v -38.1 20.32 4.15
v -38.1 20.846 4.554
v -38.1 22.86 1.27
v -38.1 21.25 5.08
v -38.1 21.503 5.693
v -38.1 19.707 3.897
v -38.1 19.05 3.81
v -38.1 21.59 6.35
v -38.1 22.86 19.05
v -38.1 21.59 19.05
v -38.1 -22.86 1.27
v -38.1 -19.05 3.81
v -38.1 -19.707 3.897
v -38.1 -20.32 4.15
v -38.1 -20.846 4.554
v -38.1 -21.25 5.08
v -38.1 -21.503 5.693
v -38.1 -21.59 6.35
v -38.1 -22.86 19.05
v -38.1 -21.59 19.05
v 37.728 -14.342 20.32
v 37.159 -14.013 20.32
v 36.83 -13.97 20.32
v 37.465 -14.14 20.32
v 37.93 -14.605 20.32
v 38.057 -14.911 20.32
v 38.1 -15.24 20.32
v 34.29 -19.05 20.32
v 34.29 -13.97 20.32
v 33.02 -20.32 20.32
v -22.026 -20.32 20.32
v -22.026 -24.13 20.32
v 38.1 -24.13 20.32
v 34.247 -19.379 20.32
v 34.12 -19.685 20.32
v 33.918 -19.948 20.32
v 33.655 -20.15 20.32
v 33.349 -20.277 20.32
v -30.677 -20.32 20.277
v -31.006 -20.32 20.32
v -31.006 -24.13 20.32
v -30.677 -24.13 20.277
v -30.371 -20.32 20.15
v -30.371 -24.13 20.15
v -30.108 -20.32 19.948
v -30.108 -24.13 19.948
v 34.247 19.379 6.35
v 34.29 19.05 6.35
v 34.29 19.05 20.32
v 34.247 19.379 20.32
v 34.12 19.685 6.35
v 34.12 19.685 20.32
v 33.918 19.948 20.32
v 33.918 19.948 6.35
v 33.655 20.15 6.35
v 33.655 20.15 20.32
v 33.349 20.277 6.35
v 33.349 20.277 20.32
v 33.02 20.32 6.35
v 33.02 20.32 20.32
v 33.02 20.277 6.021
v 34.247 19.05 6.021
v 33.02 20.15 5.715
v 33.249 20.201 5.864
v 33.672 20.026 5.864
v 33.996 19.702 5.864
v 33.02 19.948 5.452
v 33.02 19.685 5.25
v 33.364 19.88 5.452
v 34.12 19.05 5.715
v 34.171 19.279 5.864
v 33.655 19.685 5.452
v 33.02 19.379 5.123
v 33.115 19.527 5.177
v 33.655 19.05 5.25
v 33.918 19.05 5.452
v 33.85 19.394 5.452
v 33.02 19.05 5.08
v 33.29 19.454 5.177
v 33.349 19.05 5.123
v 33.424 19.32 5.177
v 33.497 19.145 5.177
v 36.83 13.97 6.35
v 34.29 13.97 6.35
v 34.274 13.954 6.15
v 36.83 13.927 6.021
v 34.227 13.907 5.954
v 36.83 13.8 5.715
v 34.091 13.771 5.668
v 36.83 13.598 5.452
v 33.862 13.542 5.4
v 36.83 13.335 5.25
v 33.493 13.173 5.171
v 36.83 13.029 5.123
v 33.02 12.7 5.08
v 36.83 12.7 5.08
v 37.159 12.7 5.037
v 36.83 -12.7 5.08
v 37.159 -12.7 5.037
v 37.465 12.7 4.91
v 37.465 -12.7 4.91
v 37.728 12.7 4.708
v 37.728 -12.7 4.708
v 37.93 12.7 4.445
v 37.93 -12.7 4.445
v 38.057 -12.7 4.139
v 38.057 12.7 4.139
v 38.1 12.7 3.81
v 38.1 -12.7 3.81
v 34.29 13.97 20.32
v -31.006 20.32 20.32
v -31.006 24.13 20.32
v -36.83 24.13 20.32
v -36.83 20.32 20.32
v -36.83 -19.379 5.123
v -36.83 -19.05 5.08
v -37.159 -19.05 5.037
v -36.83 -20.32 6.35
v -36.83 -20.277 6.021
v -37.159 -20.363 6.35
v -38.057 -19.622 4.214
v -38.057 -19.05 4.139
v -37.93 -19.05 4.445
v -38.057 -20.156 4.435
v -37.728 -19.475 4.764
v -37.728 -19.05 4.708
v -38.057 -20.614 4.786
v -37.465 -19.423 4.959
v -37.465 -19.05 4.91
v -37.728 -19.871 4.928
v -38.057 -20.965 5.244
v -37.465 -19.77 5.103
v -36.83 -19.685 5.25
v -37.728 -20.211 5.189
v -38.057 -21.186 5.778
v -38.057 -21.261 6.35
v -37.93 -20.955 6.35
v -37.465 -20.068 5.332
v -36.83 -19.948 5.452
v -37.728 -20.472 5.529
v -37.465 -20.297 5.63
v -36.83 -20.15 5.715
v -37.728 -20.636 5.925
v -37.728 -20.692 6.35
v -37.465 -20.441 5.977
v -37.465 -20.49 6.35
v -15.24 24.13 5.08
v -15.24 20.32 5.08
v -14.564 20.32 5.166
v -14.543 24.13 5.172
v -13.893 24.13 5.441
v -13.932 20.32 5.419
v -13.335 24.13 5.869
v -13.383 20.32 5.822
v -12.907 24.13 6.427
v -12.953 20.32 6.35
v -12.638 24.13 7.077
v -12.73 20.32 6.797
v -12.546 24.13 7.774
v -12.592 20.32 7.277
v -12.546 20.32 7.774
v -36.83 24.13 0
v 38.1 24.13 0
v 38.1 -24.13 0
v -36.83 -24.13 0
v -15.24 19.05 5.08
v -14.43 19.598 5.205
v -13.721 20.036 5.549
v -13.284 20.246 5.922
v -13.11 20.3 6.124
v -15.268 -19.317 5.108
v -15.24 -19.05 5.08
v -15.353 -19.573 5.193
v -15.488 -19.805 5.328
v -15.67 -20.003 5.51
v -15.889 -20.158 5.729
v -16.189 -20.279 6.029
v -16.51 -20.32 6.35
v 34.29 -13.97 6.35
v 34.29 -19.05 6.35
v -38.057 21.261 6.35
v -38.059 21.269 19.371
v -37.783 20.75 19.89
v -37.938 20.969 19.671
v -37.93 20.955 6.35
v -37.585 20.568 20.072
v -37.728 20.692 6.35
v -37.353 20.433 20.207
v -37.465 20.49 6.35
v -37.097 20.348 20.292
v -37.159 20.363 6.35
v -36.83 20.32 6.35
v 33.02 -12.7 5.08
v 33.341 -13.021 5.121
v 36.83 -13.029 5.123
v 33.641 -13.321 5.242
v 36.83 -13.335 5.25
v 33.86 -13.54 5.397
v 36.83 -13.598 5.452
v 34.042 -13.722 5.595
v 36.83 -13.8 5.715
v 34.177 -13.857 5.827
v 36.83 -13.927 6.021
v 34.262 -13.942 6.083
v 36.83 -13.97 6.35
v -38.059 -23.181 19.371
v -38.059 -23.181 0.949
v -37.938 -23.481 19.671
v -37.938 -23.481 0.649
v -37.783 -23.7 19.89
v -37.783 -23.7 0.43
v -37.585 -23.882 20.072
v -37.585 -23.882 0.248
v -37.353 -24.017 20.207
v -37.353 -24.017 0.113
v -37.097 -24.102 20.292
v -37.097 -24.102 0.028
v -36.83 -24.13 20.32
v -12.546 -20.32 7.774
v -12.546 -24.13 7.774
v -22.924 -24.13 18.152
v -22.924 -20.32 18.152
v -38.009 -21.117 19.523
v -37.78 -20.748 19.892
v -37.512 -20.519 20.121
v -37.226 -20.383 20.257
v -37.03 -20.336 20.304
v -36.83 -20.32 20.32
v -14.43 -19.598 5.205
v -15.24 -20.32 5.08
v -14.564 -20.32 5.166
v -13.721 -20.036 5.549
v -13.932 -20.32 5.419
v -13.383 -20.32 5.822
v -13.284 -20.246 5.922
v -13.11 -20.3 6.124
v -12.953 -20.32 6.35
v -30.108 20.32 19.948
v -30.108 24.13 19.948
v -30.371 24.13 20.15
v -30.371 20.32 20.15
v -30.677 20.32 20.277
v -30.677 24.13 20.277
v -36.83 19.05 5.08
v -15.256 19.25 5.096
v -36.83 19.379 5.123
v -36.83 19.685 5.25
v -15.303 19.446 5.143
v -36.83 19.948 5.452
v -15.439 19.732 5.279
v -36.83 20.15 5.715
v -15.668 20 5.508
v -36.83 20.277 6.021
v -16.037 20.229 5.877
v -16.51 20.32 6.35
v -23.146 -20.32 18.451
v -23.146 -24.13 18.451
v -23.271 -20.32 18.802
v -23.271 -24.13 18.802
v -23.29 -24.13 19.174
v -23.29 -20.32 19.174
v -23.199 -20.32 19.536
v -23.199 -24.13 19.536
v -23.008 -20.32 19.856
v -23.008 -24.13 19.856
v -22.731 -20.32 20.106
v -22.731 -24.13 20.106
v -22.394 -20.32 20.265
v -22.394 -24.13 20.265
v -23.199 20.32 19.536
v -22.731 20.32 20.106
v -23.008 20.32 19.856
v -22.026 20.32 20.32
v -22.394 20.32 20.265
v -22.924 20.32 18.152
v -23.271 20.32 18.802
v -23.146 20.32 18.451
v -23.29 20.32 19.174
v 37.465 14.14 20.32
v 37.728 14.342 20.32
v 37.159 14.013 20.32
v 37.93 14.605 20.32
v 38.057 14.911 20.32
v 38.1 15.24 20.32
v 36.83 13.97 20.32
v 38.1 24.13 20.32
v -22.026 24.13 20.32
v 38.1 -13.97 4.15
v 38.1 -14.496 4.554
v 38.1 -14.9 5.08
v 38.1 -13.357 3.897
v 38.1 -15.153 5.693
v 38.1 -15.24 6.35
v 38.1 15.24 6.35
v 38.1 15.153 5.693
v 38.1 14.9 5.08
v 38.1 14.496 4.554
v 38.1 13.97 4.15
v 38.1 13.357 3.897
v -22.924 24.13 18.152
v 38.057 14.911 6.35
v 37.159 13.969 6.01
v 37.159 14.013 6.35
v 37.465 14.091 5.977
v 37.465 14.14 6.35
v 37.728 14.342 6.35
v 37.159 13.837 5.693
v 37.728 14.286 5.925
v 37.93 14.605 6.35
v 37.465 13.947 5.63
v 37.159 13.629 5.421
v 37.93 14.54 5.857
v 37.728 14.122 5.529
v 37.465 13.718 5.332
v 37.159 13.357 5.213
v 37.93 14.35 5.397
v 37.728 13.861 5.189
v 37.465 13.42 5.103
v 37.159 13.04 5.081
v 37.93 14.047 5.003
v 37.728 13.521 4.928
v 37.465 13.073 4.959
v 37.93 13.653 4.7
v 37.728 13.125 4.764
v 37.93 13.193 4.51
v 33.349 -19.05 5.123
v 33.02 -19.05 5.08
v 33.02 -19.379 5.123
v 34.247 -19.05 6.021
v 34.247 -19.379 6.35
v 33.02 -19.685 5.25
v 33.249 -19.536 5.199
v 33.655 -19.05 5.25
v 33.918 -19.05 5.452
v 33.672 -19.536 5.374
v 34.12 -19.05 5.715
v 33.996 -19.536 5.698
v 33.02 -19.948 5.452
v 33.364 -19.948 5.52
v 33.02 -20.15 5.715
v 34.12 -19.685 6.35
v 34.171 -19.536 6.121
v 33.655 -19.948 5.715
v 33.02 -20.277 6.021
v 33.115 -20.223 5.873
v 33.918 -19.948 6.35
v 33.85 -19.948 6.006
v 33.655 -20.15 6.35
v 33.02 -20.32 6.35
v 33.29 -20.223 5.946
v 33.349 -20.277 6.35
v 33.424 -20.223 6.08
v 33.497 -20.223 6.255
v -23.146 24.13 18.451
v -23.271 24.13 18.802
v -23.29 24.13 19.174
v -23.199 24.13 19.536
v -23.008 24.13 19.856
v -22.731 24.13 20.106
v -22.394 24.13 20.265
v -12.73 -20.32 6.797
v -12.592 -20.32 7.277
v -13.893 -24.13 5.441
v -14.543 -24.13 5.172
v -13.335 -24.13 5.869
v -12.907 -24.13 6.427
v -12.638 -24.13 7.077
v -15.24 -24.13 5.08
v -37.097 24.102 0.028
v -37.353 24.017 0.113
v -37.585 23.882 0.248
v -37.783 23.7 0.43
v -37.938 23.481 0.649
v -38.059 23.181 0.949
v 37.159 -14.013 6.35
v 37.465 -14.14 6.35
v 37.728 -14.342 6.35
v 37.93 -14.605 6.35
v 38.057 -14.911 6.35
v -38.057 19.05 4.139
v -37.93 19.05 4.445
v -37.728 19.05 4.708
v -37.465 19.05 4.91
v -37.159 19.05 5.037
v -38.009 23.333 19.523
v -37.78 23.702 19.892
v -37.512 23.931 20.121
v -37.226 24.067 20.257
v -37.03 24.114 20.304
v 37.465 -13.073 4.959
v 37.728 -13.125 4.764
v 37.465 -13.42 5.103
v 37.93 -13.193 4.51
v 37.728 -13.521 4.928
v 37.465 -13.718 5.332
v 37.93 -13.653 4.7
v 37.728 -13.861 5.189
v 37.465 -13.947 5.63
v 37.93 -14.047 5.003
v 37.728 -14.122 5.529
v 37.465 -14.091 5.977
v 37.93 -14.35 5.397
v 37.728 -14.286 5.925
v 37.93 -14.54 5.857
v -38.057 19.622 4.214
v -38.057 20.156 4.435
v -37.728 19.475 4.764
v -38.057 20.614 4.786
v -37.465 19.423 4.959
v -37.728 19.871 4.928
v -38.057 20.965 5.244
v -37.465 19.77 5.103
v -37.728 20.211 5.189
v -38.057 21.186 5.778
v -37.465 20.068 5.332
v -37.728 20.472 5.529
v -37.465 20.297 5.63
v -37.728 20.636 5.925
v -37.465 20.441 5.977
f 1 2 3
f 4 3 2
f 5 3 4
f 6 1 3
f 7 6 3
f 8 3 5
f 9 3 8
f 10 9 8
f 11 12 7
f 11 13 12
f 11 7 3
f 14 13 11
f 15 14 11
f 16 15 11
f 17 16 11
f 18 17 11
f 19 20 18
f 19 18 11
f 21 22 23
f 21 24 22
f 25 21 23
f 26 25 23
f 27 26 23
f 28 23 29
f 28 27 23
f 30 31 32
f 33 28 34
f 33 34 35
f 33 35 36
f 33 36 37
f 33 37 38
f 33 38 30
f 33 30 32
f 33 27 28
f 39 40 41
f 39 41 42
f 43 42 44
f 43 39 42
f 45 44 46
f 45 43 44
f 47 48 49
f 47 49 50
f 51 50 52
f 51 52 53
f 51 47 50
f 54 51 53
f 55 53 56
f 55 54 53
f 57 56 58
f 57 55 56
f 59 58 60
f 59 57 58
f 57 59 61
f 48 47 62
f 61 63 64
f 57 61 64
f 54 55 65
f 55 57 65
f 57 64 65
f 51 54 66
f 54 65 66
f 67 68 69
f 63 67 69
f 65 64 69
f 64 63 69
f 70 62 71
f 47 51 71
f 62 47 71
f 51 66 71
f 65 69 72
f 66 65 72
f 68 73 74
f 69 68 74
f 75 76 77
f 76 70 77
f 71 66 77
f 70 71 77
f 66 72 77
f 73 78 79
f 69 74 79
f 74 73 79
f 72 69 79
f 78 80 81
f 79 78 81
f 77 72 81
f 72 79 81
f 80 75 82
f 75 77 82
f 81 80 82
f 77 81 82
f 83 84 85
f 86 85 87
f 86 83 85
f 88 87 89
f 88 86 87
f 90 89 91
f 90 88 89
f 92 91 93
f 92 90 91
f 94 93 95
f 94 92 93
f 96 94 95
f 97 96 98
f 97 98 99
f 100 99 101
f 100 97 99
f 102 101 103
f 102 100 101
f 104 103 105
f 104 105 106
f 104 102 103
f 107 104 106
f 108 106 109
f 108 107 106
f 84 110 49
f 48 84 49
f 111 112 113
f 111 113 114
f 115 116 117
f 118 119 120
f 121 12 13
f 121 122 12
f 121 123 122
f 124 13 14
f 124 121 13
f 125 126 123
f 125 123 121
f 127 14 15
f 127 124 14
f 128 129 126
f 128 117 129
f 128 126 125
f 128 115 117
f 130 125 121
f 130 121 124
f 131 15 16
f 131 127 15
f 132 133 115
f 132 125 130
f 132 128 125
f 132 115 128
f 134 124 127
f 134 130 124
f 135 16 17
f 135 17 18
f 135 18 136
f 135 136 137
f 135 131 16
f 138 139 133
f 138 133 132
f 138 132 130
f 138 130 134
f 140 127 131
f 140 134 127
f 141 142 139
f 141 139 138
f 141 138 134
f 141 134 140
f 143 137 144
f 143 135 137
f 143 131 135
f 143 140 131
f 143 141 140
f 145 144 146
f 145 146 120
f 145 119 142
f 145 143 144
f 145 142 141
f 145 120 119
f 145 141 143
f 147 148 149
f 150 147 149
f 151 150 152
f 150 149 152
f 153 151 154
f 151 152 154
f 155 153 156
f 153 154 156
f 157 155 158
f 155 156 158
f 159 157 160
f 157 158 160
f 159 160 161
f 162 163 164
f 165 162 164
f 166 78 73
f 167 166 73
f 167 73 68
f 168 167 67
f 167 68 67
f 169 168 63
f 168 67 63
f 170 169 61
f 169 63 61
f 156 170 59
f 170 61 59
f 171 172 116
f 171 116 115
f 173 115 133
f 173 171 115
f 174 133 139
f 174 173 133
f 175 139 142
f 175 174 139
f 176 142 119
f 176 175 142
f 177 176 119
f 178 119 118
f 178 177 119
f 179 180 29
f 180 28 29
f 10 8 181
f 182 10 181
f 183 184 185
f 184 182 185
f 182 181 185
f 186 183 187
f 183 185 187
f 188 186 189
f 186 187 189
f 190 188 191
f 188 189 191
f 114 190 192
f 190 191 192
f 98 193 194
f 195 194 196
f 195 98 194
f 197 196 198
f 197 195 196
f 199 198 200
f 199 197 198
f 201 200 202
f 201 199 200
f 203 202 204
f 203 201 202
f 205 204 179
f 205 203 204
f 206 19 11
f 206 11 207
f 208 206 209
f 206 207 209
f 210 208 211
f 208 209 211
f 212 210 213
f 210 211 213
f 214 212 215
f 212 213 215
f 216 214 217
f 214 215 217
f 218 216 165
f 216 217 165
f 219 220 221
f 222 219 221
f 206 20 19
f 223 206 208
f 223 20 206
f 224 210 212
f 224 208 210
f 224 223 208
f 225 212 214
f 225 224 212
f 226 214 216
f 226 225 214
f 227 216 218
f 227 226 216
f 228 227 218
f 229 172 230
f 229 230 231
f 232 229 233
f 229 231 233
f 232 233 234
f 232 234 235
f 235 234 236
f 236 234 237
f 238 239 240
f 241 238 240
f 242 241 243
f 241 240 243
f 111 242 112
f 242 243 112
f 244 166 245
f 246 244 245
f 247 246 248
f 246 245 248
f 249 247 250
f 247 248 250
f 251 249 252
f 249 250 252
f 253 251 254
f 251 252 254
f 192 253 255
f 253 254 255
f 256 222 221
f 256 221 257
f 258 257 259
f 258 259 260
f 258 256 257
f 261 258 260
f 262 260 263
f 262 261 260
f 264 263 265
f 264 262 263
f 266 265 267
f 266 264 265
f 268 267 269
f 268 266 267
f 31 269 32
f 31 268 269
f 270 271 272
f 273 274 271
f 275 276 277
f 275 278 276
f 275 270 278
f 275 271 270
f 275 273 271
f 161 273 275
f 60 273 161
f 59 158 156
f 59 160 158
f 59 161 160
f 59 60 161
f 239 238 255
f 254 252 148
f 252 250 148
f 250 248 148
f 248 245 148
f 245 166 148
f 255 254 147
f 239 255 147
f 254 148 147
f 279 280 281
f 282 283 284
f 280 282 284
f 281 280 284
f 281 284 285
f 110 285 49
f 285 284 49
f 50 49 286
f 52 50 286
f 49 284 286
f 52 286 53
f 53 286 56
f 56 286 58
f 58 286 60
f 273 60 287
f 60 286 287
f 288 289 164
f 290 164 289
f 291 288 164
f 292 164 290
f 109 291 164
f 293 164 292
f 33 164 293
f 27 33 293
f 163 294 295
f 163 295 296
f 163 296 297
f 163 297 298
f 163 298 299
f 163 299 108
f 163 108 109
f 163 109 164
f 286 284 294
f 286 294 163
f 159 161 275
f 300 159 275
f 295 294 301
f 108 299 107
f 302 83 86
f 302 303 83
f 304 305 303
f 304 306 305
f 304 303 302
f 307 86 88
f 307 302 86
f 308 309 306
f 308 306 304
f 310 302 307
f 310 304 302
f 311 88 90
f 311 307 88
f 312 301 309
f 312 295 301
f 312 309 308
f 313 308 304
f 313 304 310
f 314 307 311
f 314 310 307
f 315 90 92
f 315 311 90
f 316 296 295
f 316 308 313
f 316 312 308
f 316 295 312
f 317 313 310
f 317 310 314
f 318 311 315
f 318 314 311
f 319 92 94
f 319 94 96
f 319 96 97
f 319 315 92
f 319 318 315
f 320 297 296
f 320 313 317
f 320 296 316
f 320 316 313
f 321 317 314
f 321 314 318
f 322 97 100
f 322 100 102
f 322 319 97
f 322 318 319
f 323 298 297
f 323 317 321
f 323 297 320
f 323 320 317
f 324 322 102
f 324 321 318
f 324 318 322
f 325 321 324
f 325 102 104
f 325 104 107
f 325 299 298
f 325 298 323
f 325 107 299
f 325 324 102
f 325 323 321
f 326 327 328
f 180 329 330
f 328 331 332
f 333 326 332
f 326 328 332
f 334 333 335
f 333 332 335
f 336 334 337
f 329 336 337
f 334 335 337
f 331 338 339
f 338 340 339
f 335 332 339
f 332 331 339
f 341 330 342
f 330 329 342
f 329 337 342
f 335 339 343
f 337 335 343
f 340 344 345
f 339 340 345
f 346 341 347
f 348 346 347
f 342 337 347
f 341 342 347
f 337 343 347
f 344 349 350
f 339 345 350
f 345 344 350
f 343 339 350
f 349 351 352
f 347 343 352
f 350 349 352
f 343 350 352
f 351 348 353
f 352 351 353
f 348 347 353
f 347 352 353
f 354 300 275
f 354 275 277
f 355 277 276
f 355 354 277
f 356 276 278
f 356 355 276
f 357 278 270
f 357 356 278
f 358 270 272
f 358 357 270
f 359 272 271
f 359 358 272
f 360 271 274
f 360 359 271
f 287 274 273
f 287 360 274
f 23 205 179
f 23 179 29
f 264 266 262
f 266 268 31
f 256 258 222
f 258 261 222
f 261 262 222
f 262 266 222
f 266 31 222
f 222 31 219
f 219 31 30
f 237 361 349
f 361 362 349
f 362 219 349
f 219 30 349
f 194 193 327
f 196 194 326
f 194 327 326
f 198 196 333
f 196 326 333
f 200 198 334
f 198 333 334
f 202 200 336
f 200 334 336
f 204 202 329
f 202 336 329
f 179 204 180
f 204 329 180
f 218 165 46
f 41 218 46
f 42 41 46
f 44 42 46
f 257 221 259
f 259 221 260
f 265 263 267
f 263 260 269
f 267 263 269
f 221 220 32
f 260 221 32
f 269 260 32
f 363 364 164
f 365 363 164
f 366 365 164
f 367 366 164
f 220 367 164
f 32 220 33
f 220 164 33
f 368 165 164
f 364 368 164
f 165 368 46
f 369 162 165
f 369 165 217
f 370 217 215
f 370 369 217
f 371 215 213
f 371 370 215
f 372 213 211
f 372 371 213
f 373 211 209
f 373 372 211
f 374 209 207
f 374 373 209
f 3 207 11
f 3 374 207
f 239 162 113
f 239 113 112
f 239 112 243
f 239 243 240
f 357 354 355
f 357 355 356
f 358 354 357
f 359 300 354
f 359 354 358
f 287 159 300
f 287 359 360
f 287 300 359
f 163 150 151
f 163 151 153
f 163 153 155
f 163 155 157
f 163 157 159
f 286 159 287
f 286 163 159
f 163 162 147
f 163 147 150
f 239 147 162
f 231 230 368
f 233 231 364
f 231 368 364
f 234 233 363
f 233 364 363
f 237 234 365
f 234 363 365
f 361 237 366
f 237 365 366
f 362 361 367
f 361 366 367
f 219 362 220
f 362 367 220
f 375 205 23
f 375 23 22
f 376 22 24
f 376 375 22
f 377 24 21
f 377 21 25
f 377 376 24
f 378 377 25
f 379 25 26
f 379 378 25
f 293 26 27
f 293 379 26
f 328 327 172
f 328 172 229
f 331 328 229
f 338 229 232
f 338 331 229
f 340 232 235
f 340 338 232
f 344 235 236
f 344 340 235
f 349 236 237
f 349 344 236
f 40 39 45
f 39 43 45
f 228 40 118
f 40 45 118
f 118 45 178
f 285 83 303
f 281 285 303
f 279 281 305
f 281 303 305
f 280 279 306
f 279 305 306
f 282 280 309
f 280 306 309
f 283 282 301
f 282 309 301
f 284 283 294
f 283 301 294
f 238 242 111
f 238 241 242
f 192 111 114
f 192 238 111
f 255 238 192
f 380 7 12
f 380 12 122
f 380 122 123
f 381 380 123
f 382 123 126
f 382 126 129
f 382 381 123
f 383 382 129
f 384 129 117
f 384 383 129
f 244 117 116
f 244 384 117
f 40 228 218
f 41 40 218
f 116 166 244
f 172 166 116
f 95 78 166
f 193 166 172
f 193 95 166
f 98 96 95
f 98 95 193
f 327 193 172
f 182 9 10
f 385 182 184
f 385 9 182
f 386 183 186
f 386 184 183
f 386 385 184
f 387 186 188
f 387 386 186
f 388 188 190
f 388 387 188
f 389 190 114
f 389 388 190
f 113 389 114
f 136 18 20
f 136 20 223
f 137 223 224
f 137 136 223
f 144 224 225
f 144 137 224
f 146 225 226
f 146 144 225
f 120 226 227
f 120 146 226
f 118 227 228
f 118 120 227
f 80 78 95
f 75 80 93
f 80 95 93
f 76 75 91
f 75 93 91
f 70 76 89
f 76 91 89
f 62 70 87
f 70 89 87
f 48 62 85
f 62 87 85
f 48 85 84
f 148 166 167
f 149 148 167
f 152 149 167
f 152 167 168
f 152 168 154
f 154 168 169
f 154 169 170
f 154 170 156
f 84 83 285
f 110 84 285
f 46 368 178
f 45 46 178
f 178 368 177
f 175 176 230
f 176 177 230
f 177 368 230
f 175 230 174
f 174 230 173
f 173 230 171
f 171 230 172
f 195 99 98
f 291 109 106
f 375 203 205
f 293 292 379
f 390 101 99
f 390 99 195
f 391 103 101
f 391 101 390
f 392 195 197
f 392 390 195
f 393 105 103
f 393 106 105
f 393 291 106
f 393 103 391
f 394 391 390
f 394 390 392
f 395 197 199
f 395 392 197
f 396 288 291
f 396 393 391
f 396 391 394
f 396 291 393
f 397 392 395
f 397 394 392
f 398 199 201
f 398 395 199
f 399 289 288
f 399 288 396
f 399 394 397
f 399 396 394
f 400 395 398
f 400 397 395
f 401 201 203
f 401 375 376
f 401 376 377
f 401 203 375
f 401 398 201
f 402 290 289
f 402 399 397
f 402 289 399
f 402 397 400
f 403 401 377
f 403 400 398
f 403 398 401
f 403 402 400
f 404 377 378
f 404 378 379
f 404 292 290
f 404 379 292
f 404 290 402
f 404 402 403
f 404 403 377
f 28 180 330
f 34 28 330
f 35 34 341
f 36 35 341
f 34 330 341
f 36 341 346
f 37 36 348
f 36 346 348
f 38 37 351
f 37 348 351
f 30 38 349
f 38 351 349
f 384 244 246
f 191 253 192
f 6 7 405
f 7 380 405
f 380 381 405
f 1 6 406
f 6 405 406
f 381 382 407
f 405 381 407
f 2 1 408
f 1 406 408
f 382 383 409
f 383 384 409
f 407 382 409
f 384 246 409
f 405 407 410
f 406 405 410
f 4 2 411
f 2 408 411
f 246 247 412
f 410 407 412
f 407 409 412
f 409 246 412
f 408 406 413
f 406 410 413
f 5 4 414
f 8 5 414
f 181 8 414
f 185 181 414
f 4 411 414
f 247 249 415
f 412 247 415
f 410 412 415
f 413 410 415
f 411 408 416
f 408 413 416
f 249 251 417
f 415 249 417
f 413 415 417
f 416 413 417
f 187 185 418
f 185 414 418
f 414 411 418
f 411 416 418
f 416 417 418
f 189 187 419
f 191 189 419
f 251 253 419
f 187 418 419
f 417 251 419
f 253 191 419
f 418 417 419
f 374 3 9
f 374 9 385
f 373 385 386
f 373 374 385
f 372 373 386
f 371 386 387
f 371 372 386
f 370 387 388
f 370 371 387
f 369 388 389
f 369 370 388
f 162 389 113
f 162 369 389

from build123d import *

# Parameters (mm, degrees)
F1_DEPTH     = 20.32
F2_W         = 34.29
F2_H         = 20.32
F3_DEPTH     = 15.24
F4_DEPTH     = 38.1
F6_DEPTH     = 76.2
F7_W         = 27.94
F7_H         = 15.24
F8_DEPTH     = 25.4
F9_T1_DEPTH  = 3.81
F9_T3_DEPTH  = 5.08
F9_T5_DEPTH  = 5.08
F9_T7_DEPTH  = 13.97
F9_S11_W     = 1.2954
F9_S11_H     = 1.2954
F9_T12_DEPTH = 1.2954
F9_S17_W     = 1.2954
F9_S17_H     = 1.2954
F9_T18_DEPTH = 1.2954
F9_T24_DEPTH = 48.26
F9_S25_R     = 2.6940768363
F9_T26_DEPTH = 26
F9_T30_DEPTH = 22.86
F9_T35_DEPTH = 22.86
F9_T40_DEPTH = 48.26
F9_S41_R     = 2.6940768363
F9_T42_DEPTH = 26
F9_T47_DEPTH = 6.985
F9_T51_DEPTH = 8.255
F9_T58_DEPTH = 6.985
F9_T62_DEPTH = 8.255
F9_T65_DEPTH = 25.4
F9_T67_DEPTH = 38.1
F9_T69_DEPTH = 19.1402561211
F9_T71_DEPTH = 6.4402561211
F9_T73_DEPTH = 19.1402561211
F9_T75_DEPTH = 6.4402561211
F9_T77_DEPTH = 54.61
F9_T79_DEPTH = 26.67
F9_T81_DEPTH = 10.16
F9_T83_DEPTH = 17.145
F9_T85_DEPTH = 10.16
F9_T88_ANGLE = 90
F9_T90_ANGLE = 90
F9_T92_ANGLE = 90
F9_T94_ANGLE = 90


# Not quite as in the source:
# - a fillet or chamfer that OpenCascade refuses, or shapes differently, is made with other operations: its cross-section is extruded or revolved along the edge and cut away or added


with BuildPart() as f1:
    # F0 (on Top) → F1 (new body)
    with BuildSketch(Plane.XY):
        Polygon((0, 24.13), (0, 0), (0, -24.13), (38.1, -24.13), (38.1, 24.13), align=None)
    extrude(amount=F1_DEPTH)

    # F2 (on face) → F3 (cut)
    with BuildSketch(Plane.XY.offset(20.32)):
        with Locations((17.145, 10.16)):
            Rectangle(F2_W, F2_H)
        with Locations((17.145, -10.16)):
            Rectangle(F2_W, F2_H)
    extrude(amount=-F3_DEPTH, mode=Mode.SUBTRACT)

    # F4 (add): a face of the model
    f4_faces = [f1.faces().sort_by_distance(p)[0] for p in [
        (0, 0, 0.5236344145),
    ]]
    extrude(f4_faces, amount=F4_DEPTH)

    # F5 (on face) → F6 (cut)
    with BuildSketch(Plane.XZ.offset(24.13)):
        with BuildLine():
            Line((-25.0918463274, 20.32), (-30.48, 20.32))
            Line((-30.48, 20.32), (-15.24, 5.08))
            ThreePointArc((-15.24, 5.08), (-13.335, 5.8690768363), (-12.5459231637, 7.7740768363))
            Line((-12.5459231637, 7.7740768363), (-25.0918463274, 20.32))
        make_face()
    extrude(amount=-F6_DEPTH, mode=Mode.SUBTRACT)

    # F7 (on face) → F8 (cut)
    with BuildSketch(Plane.YZ.offset(38.1)):
        with Locations((0, 12.7)):
            Rectangle(F7_W, F7_H)
    extrude(amount=-F8_DEPTH, mode=Mode.SUBTRACT)

    # F9: fillet of radius 1.27 on 25 edges, made by hand

    # F9_s2 → F9_t1 (join)
    with BuildSketch(Plane.YZ.offset(34.29)):
        with BuildLine():
            ThreePointArc((-12.7, 5.08), (-13.5980256121, 5.4519743879), (-13.97, 6.35))
            Line((-13.97, 6.35), (-13.97, 5.08))
            Line((-13.97, 5.08), (-12.7, 5.08))
        make_face()
        with BuildLine():
            ThreePointArc((13.97, 6.35), (13.5980256121, 5.4519743879), (12.7, 5.08))
            Line((12.7, 5.08), (13.97, 5.08))
            Line((13.97, 5.08), (13.97, 6.35))
        make_face()
    extrude(amount=F9_T1_DEPTH)

    # F9_s4 → F9_t3 (join)
    with BuildSketch(Plane.XZ.offset(13.97)):
        with BuildLine():
            ThreePointArc((33.02, 5.08), (33.9180256121, 5.4519743879), (34.29, 6.35))
            Line((34.29, 6.35), (34.29, 5.08))
            Line((34.29, 5.08), (33.02, 5.08))
        make_face()
    extrude(amount=F9_T3_DEPTH)

    # F9_s6 → F9_t5 (join)
    with BuildSketch(Plane.XZ.offset(-19.05)):
        with BuildLine():
            ThreePointArc((33.02, 5.08), (33.9180256121, 5.4519743879), (34.29, 6.35))
            Line((34.29, 6.35), (34.29, 5.08))
            Line((34.29, 5.08), (33.02, 5.08))
        make_face()
    extrude(amount=F9_T5_DEPTH)

    # F9_s8 → F9_t7 (join)
    with BuildSketch(Plane.XY.offset(6.35)):
        with BuildLine():
            ThreePointArc((34.29, 19.05), (33.9180256121, 19.9480256121), (33.02, 20.32))
            Line((33.02, 20.32), (34.29, 20.32))
            Line((34.29, 20.32), (34.29, 19.05))
        make_face()
        with BuildLine():
            ThreePointArc((34.29, -19.05), (33.9180256121, -19.9480256121), (33.02, -20.32))
            Line((33.02, -20.32), (34.29, -20.32))
            Line((34.29, -20.32), (34.29, -19.05))
        make_face()
    extrude(amount=F9_T7_DEPTH)


with BuildPart() as f9_tool10:
    # F9_s11 → F9_t12 (new body)
    with BuildSketch(Plane.XZ.offset(19.05)):
        with Locations((33.6677, 5.7023)):
            Rectangle(F9_S11_W, F9_S11_H)
    extrude(amount=F9_T12_DEPTH)

    # F9_s13 → F9_t14 (revolve, cut)
    with BuildSketch(Plane(origin=(33.02, -19.05, 6.35), x_dir=(-0.7071067812, 0, 0.7071067812), z_dir=(0.7071067812, 0, 0.7071067812))):
        with BuildLine():
            ThreePointArc((0, -1.27), (1.27, 0), (0, 1.27))
            Line((0, 1.27), (0, -1.27))
        make_face()
    revolve(axis=Axis((33.02, -19.05, 6.35), (0, -1, 0)), mode=Mode.SUBTRACT)


with BuildPart() as f1_1:
    add(f1.part)

    # F9_t9: union F9_tool10
    add(f9_tool10.part)


with BuildPart() as f9_tool16:
    # F9_s17 → F9_t18 (new body)
    with BuildSketch(Plane.XY.offset(6.35)):
        with Locations((33.6677, 19.6977)):
            Rectangle(F9_S17_W, F9_S17_H)
    extrude(amount=-F9_T18_DEPTH)

    # F9_s19 → F9_t20 (revolve, cut)
    with BuildSketch(Plane(origin=(33.02, 19.05, 6.35), x_dir=(-0.7071067812, -0.7071067812, 0), z_dir=(0.7071067812, -0.7071067812, 0))):
        with BuildLine():
            ThreePointArc((0, -1.27), (1.27, 0), (0, 1.27))
            Line((0, 1.27), (0, -1.27))
        make_face()
    revolve(axis=Axis((33.02, 19.05, 6.35), (0, 0, -1)), mode=Mode.SUBTRACT)


with BuildPart() as f1_2:
    add(f1_1.part)

    # F9_t15: union F9_tool16
    add(f9_tool16.part)


with BuildPart() as f9_tool22:
    # F9_s23 → F9_t24 (new body)
    with BuildSketch(Plane.YZ.offset(33.02)):
        with BuildLine():
            ThreePointArc((-19.05, 5.08), (-19.9480256121, 5.4519743879), (-20.32, 6.35))
            Line((-20.32, 6.35), (-20.32, 5.08))
            Line((-20.32, 5.08), (-19.05, 5.08))
        make_face()
    extrude(amount=-F9_T24_DEPTH)

    # F9_s25 → F9_t26 (cut, symmetric)
    with BuildSketch(Plane.XZ.offset(19.7)):
        with Locations((-15.24, 7.7740768363)):
            Circle(F9_S25_R)
    extrude(amount=F9_T26_DEPTH, both=True, mode=Mode.SUBTRACT)


with BuildPart() as f1_3:
    add(f1_2.part)

    # F9_t21: union F9_tool22
    add(f9_tool22.part)


with BuildPart() as f9_tool28:
    # F9_s29 → F9_t30 (new body)
    with BuildSketch(Plane.YZ.offset(-15.24)):
        with BuildLine():
            ThreePointArc((-19.05, 5.08), (-19.9480256121, 5.4519743879), (-20.32, 6.35))
            Line((-20.32, 6.35), (-20.32, 5.08))
            Line((-20.32, 5.08), (-19.05, 5.08))
        make_face()
    extrude(amount=-F9_T30_DEPTH)

    split(bisect_by=Plane(origin=(-5.08, 0, -5.08), x_dir=(0, 1, 0), z_dir=(-0.7071067812, 0, -0.7071067812)), keep=Keep.TOP)


with BuildPart() as f1_4:
    add(f1_3.part)

    # F9_t27: union F9_tool28
    add(f9_tool28.part)


with BuildPart() as f9_tool33:
    # F9_s34 → F9_t35 (new body)
    with BuildSketch(Plane.YZ.offset(-15.24)):
        with BuildLine():
            ThreePointArc((19.05, 5.08), (19.9480256121, 5.4519743879), (20.32, 6.35))
            Line((20.32, 6.35), (20.32, 5.08))
            Line((20.32, 5.08), (19.05, 5.08))
        make_face()
    extrude(amount=-F9_T35_DEPTH)

    split(bisect_by=Plane(origin=(-5.08, 0, -5.08), x_dir=(0, 1, 0), z_dir=(-0.7071067812, 0, -0.7071067812)), keep=Keep.TOP)


with BuildPart() as f1_5:
    add(f1_4.part)

    # F9_t32: union F9_tool33
    add(f9_tool33.part)


with BuildPart() as f9_tool38:
    # F9_s39 → F9_t40 (new body)
    with BuildSketch(Plane.YZ.offset(33.02)):
        with BuildLine():
            ThreePointArc((19.05, 5.08), (19.9480256121, 5.4519743879), (20.32, 6.35))
            Line((20.32, 6.35), (20.32, 5.08))
            Line((20.32, 5.08), (19.05, 5.08))
        make_face()
    extrude(amount=-F9_T40_DEPTH)

    # F9_s41 → F9_t42 (cut, symmetric)
    with BuildSketch(Plane.XZ.offset(-19.7)):
        with Locations((-15.24, 7.7740768363)):
            Circle(F9_S41_R)
    extrude(amount=F9_T42_DEPTH, both=True, mode=Mode.SUBTRACT)


with BuildPart() as f1_6:
    add(f1_5.part)

    # F9_t37: union F9_tool38
    add(f9_tool38.part)


with BuildPart() as f9_tool45:
    # F9_s46 → F9_t47 (new body)
    with BuildSketch(Plane.YZ.offset(38.1)):
        with BuildLine():
            ThreePointArc((-12.7, 5.08), (-13.5980256121, 5.4519743879), (-13.97, 6.35))
            Line((-13.97, 6.35), (-13.97, 5.08))
            Line((-13.97, 5.08), (-12.7, 5.08))
        make_face()
    extrude(amount=-F9_T47_DEPTH)

    split(bisect_by=Plane.YZ.offset(34.29), keep=Keep.BOTTOM)


with BuildPart() as f9_tool49:
    # F9_s50 → F9_t51 (new body)
    with BuildSketch(Plane.XZ.offset(19.05)):
        with BuildLine():
            ThreePointArc((33.02, 5.08), (33.9180256121, 5.4519743879), (34.29, 6.35))
            Line((34.29, 6.35), (34.29, 5.08))
            Line((34.29, 5.08), (33.02, 5.08))
        make_face()
    extrude(amount=-F9_T51_DEPTH)

    split(bisect_by=Plane.XZ.offset(13.97), keep=Keep.BOTTOM)


with BuildPart() as f9_tool45_1:
    add(f9_tool45.part)

    # F9_t53: intersect F9_tool49
    add(f9_tool49.part, mode=Mode.INTERSECT)


with BuildPart() as f1_7:
    add(f1_6.part)

    # F9_t43: union F9_tool45
    add(f9_tool45_1.part)


with BuildPart() as f9_tool56:
    # F9_s57 → F9_t58 (new body)
    with BuildSketch(Plane.YZ.offset(38.1)):
        with BuildLine():
            ThreePointArc((13.97, 6.35), (13.5980256121, 5.4519743879), (12.7, 5.08))
            Line((12.7, 5.08), (13.97, 5.08))
            Line((13.97, 5.08), (13.97, 6.35))
        make_face()
    extrude(amount=-F9_T58_DEPTH)

    split(bisect_by=Plane.YZ.offset(34.29), keep=Keep.BOTTOM)


with BuildPart() as f9_tool60:
    # F9_s61 → F9_t62 (new body)
    with BuildSketch(Plane.XZ.offset(-10.795)):
        with BuildLine():
            ThreePointArc((33.02, 5.08), (33.9180256121, 5.4519743879), (34.29, 6.35))
            Line((34.29, 6.35), (34.29, 5.08))
            Line((34.29, 5.08), (33.02, 5.08))
        make_face()
    extrude(amount=-F9_T62_DEPTH)

    split(bisect_by=Plane.XZ.offset(-13.97), keep=Keep.TOP)


with BuildPart() as f9_tool56_1:
    add(f9_tool56.part)

    # F9_t64: intersect F9_tool60
    add(f9_tool60.part, mode=Mode.INTERSECT)


with BuildPart() as f1_8:
    add(f1_7.part)

    # F9_t54: union F9_tool56
    add(f9_tool56_1.part)

    # F9_s66 → F9_t65 (cut)
    with BuildSketch(Plane.XZ.offset(-12.7)):
        with BuildLine():
            ThreePointArc((36.83, 5.08), (37.7280256121, 4.7080256121), (38.1, 3.81))
            Line((38.1, 3.81), (38.1, 5.08))
            Line((38.1, 5.08), (36.83, 5.08))
        make_face()
    extrude(amount=F9_T65_DEPTH, mode=Mode.SUBTRACT)

    # F9_s68 → F9_t67 (cut)
    with BuildSketch(Plane.XZ.offset(-19.05)):
        with BuildLine():
            ThreePointArc((-38.1, 3.81), (-37.7280256121, 4.7080256121), (-36.83, 5.08))
            Line((-36.83, 5.08), (-38.1, 5.08))
            Line((-38.1, 5.08), (-38.1, 3.81))
        make_face()
    extrude(amount=F9_T67_DEPTH, mode=Mode.SUBTRACT)

    # F9_s70 → F9_t69 (cut)
    with BuildSketch(Plane.XZ.offset(-31.7951280605)):
        with BuildLine():
            ThreePointArc((-22.9238207153, 18.1519743879), (-23.1991221094, 19.5360079591), (-22.0257951031, 20.32))
            Line((-22.0257951031, 20.32), (-25.0918463274, 20.32))
            Line((-25.0918463274, 20.32), (-22.9238207153, 18.1519743879))
        make_face()
    extrude(amount=F9_T69_DEPTH, mode=Mode.SUBTRACT)

    # F9_s72 → F9_t71 (cut)
    with BuildSketch(Plane.XZ.offset(-25.4451280605)):
        with BuildLine():
            ThreePointArc((-30.1080256121, 19.9480256121), (-30.5200432651, 20.2233270063), (-31.0060512242, 20.32))
            Line((-31.0060512242, 20.32), (-30.48, 20.32))
            Line((-30.48, 20.32), (-30.1080256121, 19.9480256121))
        make_face()
    extrude(amount=F9_T71_DEPTH, mode=Mode.SUBTRACT)

    # F9_s74 → F9_t73 (cut)
    with BuildSketch(Plane.XZ.offset(12.6548719395)):
        with BuildLine():
            ThreePointArc((-22.9238207153, 18.1519743879), (-23.1991221094, 19.5360079591), (-22.0257951031, 20.32))
            Line((-22.0257951031, 20.32), (-25.0918463274, 20.32))
            Line((-25.0918463274, 20.32), (-22.9238207153, 18.1519743879))
        make_face()
    extrude(amount=F9_T73_DEPTH, mode=Mode.SUBTRACT)

    # F9_s76 → F9_t75 (cut)
    with BuildSketch(Plane.XZ.offset(19.0048719395)):
        with BuildLine():
            ThreePointArc((-31.0060512242, 20.32), (-30.5200432651, 20.2233270063), (-30.1080256121, 19.9480256121))
            Line((-30.1080256121, 19.9480256121), (-30.48, 20.32))
            Line((-30.48, 20.32), (-31.0060512242, 20.32))
        make_face()
    extrude(amount=F9_T75_DEPTH, mode=Mode.SUBTRACT)

    # F9_s78 → F9_t77 (cut)
    with BuildSketch(Plane.XZ.offset(-27.305)):
        with BuildLine():
            ThreePointArc((-36.83, 0), (-37.7280256121, 0.3719743879), (-38.1, 1.27))
            Line((-38.1, 1.27), (-38.1, 0))
            Line((-38.1, 0), (-36.83, 0))
        make_face()
    extrude(amount=F9_T77_DEPTH, mode=Mode.SUBTRACT)

    # F9_s80 → F9_t79 (cut)
    with BuildSketch(Plane.XY.offset(-3.175)):
        with BuildLine():
            ThreePointArc((-38.1, -22.86), (-37.7280256121, -23.7580256121), (-36.83, -24.13))
            Line((-36.83, -24.13), (-38.1, -24.13))
            Line((-38.1, -24.13), (-38.1, -22.86))
        make_face()
        with BuildLine():
            ThreePointArc((-38.1, 22.86), (-37.7280256121, 23.7580256121), (-36.83, 24.13))
            Line((-36.83, 24.13), (-38.1, 24.13))
            Line((-38.1, 24.13), (-38.1, 22.86))
        make_face()
    extrude(amount=F9_T79_DEPTH, mode=Mode.SUBTRACT)

    # F9_s82 → F9_t81 (cut)
    with BuildSketch(Plane.XZ.offset(17.145)):
        with BuildLine():
            ThreePointArc((-38.1, 19.05), (-37.7280256121, 19.9480256121), (-36.83, 20.32))
            Line((-36.83, 20.32), (-38.1, 20.32))
            Line((-38.1, 20.32), (-38.1, 19.05))
        make_face()
    extrude(amount=F9_T81_DEPTH, mode=Mode.SUBTRACT)

    # F9_s84 → F9_t83 (cut)
    with BuildSketch(Plane.XY.offset(6.35)):
        with BuildLine():
            ThreePointArc((-38.1, -21.59), (-37.7280256121, -20.6919743879), (-36.83, -20.32))
            Line((-36.83, -20.32), (-38.1, -20.32))
            Line((-38.1, -20.32), (-38.1, -21.59))
        make_face()
        with BuildLine():
            ThreePointArc((-38.1, 21.59), (-37.7280256121, 20.6919743879), (-36.83, 20.32))
            Line((-36.83, 20.32), (-38.1, 20.32))
            Line((-38.1, 20.32), (-38.1, 21.59))
        make_face()
        with BuildLine():
            ThreePointArc((36.83, 13.97), (37.7280256121, 14.3419743879), (38.1, 15.24))
            Line((38.1, 15.24), (38.1, 13.97))
            Line((38.1, 13.97), (36.83, 13.97))
        make_face()
        with BuildLine():
            ThreePointArc((36.83, -13.97), (37.7280256121, -14.3419743879), (38.1, -15.24))
            Line((38.1, -15.24), (38.1, -13.97))
            Line((38.1, -13.97), (36.83, -13.97))
        make_face()
    extrude(amount=F9_T83_DEPTH, mode=Mode.SUBTRACT)

    # F9_s86 → F9_t85 (cut)
    with BuildSketch(Plane.XZ.offset(-27.305)):
        with BuildLine():
            ThreePointArc((-38.1, 19.05), (-37.7280256121, 19.9480256121), (-36.83, 20.32))
            Line((-36.83, 20.32), (-38.1, 20.32))
            Line((-38.1, 20.32), (-38.1, 19.05))
        make_face()
    extrude(amount=F9_T85_DEPTH, mode=Mode.SUBTRACT)

    # F9_s87 → F9_t88 (revolve, cut)
    with BuildSketch(Plane.XZ.offset(12.7)):
        with BuildLine():
            ThreePointArc((36.83, 5.08), (37.7280256121, 4.7080256121), (38.1, 3.81))
            Line((38.1, 3.81), (38.1, 5.08))
            Line((38.1, 5.08), (36.83, 5.08))
        make_face()
    revolve(axis=Axis((38.1, -12.7, 6.35), (-1, 0, 0)), revolution_arc=F9_T88_ANGLE, mode=Mode.SUBTRACT)

    # F9_s89 → F9_t90 (revolve, cut)
    with BuildSketch(Plane.XY.offset(6.35)):
        with BuildLine():
            ThreePointArc((36.83, 13.97), (37.7280256121, 14.3419743879), (38.1, 15.24))
            Line((38.1, 15.24), (38.1, 13.97))
            Line((38.1, 13.97), (36.83, 13.97))
        make_face()
    revolve(axis=Axis((38.1, 12.7, 6.35), (-1, 0, 0)), revolution_arc=F9_T90_ANGLE, mode=Mode.SUBTRACT)

    # F9_s91 → F9_t92 (revolve, cut)
    with BuildSketch(Plane.XZ.offset(-19.05)):
        with BuildLine():
            ThreePointArc((-38.1, 3.81), (-37.7280256121, 4.7080256121), (-36.83, 5.08))
            Line((-36.83, 5.08), (-38.1, 5.08))
            Line((-38.1, 5.08), (-38.1, 3.81))
        make_face()
    revolve(axis=Axis((-38.1, 19.05, 6.35), (1, 0, 0)), revolution_arc=F9_T92_ANGLE, mode=Mode.SUBTRACT)

    # F9_s93 → F9_t94 (revolve, cut)
    with BuildSketch(Plane.XZ.offset(19.05)):
        with BuildLine():
            ThreePointArc((-38.1, 3.81), (-37.7280256121, 4.7080256121), (-36.83, 5.08))
            Line((-36.83, 5.08), (-38.1, 5.08))
            Line((-38.1, 5.08), (-38.1, 3.81))
        make_face()
    revolve(axis=Axis((-38.1, -19.05, 6.35), (-1, 0, 0)), revolution_arc=F9_T94_ANGLE, mode=Mode.SUBTRACT)


solid = f1_8.part
